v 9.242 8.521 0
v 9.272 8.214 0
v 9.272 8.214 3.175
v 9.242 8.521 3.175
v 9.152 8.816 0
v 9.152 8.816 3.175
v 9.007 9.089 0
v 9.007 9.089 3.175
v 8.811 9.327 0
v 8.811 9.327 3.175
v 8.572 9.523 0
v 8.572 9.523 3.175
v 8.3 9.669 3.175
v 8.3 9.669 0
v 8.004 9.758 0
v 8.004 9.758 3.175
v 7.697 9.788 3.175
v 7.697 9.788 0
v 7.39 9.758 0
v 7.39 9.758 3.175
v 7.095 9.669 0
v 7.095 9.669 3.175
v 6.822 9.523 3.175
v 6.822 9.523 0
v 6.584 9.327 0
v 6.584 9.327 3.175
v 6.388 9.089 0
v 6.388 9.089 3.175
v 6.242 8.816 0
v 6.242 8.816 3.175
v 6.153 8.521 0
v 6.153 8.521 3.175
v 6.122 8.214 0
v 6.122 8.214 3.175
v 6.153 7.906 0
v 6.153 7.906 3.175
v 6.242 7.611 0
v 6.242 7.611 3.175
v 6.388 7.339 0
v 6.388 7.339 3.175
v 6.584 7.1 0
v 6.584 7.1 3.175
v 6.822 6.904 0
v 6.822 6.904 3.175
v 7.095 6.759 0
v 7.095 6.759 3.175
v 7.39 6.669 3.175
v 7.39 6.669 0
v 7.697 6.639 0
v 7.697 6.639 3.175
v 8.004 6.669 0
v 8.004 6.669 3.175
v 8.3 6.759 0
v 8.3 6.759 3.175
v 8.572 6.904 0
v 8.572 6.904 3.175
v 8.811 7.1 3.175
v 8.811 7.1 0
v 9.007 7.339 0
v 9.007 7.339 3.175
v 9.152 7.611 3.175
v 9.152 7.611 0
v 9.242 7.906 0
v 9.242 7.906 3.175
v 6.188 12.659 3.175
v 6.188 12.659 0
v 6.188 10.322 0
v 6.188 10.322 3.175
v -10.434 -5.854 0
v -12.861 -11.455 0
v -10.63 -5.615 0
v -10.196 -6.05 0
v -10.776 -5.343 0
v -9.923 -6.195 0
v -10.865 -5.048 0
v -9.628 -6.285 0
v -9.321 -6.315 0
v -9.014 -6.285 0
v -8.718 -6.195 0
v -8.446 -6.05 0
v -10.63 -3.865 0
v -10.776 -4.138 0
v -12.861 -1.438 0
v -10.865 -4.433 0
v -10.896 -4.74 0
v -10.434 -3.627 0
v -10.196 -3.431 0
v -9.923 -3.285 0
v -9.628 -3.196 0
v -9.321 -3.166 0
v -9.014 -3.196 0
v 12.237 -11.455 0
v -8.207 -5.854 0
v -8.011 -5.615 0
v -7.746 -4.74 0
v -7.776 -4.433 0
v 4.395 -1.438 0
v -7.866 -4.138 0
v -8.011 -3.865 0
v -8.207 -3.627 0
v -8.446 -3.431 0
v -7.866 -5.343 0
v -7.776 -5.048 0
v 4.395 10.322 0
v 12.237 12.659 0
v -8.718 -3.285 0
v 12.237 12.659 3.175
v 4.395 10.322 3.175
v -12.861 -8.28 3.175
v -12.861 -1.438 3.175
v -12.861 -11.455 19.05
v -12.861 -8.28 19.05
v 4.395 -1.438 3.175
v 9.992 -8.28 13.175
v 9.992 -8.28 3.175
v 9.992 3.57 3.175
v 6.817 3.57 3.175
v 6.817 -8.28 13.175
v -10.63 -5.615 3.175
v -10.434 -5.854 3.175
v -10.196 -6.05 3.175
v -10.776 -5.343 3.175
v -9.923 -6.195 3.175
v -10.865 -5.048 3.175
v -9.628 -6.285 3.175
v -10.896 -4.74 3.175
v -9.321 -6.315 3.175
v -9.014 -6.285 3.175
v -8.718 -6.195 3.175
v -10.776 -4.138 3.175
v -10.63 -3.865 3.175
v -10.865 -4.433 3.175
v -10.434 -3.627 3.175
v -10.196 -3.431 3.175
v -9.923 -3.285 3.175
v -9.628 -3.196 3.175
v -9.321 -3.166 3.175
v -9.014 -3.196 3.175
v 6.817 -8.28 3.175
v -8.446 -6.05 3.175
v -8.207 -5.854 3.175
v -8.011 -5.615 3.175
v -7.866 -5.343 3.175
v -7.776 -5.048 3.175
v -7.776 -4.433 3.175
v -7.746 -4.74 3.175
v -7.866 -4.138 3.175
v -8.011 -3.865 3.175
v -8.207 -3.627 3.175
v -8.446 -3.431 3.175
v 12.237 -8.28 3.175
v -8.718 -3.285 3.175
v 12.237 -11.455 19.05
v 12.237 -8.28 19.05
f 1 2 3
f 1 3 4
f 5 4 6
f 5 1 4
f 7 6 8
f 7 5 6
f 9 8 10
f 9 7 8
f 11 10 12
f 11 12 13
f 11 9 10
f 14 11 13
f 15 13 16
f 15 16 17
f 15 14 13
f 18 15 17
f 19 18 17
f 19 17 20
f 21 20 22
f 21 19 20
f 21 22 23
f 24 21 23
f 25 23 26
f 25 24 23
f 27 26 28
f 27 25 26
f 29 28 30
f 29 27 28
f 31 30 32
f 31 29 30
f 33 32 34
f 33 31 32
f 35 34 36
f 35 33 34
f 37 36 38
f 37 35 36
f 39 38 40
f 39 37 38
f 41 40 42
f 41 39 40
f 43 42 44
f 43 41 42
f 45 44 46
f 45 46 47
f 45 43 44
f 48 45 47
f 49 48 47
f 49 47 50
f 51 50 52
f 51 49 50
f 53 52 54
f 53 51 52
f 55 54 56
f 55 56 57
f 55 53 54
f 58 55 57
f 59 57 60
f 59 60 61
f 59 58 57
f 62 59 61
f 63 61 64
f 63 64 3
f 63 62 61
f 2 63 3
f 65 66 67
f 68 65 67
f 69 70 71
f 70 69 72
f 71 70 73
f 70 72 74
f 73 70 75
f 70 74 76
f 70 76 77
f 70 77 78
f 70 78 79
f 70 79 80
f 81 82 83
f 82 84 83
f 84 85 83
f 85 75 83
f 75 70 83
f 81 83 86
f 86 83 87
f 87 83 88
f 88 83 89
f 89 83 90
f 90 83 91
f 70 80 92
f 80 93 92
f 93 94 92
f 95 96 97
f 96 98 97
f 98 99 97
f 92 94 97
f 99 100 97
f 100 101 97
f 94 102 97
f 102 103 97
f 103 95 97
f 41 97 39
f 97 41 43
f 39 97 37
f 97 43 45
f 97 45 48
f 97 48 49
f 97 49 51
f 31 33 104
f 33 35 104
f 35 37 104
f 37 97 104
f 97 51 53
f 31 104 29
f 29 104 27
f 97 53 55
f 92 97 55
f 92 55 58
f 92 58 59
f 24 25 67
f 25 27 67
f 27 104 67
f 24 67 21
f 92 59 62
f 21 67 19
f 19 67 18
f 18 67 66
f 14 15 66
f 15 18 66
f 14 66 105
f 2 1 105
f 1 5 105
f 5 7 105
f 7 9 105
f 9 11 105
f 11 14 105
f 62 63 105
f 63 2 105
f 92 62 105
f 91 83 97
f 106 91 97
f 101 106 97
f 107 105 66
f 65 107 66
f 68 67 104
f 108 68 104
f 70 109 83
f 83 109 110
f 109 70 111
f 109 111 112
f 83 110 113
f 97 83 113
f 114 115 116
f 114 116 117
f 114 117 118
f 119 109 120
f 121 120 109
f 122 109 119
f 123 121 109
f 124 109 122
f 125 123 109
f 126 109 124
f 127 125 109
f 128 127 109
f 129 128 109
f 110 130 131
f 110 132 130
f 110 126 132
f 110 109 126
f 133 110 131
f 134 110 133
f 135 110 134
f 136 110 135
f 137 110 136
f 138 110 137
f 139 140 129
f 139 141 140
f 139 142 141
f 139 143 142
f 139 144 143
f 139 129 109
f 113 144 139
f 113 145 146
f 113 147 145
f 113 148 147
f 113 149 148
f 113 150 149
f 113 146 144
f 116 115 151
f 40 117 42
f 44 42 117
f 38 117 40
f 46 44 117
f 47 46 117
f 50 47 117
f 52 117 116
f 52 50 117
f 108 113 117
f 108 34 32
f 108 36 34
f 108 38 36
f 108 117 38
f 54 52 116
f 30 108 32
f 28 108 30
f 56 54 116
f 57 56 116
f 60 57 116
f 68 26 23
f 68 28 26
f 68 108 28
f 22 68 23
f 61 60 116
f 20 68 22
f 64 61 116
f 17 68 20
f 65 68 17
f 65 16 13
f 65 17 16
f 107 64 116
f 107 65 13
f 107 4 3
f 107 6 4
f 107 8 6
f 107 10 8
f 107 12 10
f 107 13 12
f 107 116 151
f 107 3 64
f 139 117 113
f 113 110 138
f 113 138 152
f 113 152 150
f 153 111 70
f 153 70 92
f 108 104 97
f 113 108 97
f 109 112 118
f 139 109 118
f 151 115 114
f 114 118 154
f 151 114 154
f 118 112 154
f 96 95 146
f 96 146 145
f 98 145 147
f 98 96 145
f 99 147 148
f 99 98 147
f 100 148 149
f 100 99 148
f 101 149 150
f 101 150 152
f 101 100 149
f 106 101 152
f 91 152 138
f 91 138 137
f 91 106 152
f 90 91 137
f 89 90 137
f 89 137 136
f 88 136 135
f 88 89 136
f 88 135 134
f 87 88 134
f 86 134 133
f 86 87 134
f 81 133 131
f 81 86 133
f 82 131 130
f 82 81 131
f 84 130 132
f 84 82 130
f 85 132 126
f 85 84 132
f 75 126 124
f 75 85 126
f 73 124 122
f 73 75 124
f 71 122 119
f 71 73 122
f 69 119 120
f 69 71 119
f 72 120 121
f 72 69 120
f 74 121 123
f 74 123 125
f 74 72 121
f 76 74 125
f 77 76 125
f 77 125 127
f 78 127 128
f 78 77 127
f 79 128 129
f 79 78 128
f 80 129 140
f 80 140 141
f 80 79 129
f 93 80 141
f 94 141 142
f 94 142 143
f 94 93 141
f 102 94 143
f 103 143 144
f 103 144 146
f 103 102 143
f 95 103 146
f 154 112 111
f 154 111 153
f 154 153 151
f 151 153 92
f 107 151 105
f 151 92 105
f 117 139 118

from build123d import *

# Parameters (mm, degrees)
SKETCH2_R           = 1.5748
BOSS_EXTRUDE1_DEPTH = 3.175
SKETCH5_W           = 24.098
SKETCH5_H           = 3.175
BOSS_EXTRUDE2_DEPTH = 19.05
SKETCH7_W           = 1
SKETCH7_H           = 6.842
BOSS_EXTRUDE3_DEPTH = 3.175
SKETCH8_W           = 1
SKETCH8_H           = 3.175
BOSS_EXTRUDE4_DEPTH = 19.05
SKETCH9_W           = 3.175
SKETCH9_H           = 11.85042952
BOSS_EXTRUDE5_DEPTH = 10
CUT_EXTRUDE1_DEPTH  = 33.332180825


with BuildPart() as part:
    # Sketch2 → Boss-Extrude1 (new body)
    with BuildSketch(Plane.XY):
        Polygon((4.395213829, 10.321811953), (4.395213829, 7.827388121), (4.395213829, -1.438404904), (-11.860786171, -1.438404904), (-11.860786171, -8.280404904), (12.237213829, -8.280404904), (12.237213829, 12.658595096), (7.697213829, 12.658595096), (6.188170382, 12.658595096), (6.188170382, 10.321811953), align=None)
        with Locations((-9.320786171, -4.740404904)):
            Circle(SKETCH2_R, mode=Mode.SUBTRACT)
        with Locations((7.697213829, 8.213595096)):
            Circle(SKETCH2_R, mode=Mode.SUBTRACT)
    extrude(amount=BOSS_EXTRUDE1_DEPTH)

    # Sketch5 → Boss-Extrude2 (add)
    with BuildSketch(Plane(origin=(0, 0, 0), x_dir=(-1, 0, 0), z_dir=(0, 0, -1))):
        with Locations((-0.188213829, -9.867904904)):
            Rectangle(SKETCH5_W, SKETCH5_H)
    extrude(amount=-BOSS_EXTRUDE2_DEPTH)

    # Sketch7 → Boss-Extrude3 (add)
    with BuildSketch(Plane.XY.offset(3.175)):
        with Locations((-12.360786171, -4.859404904)):
            Rectangle(SKETCH7_W, SKETCH7_H)
    extrude(amount=-BOSS_EXTRUDE3_DEPTH)

    # Sketch8 → Boss-Extrude4 (add)
    with BuildSketch(Plane.XY.offset(19.05)):
        with Locations((-12.360786171, -9.867904904)):
            Rectangle(SKETCH8_W, SKETCH8_H)
    extrude(amount=-BOSS_EXTRUDE4_DEPTH)

    # Sketch9 → Boss-Extrude5 (add)
    with BuildSketch(Plane.XY.offset(3.175)):
        with Locations((8.404008836, -2.355190144)):
            Rectangle(SKETCH9_W, SKETCH9_H)
    extrude(amount=BOSS_EXTRUDE5_DEPTH)

    # Sketch10 → Cut-Extrude1 (cut, through all)
    with BuildSketch(Plane(origin=(9.991508836, 0, 0), x_dir=(0, 0, -1), z_dir=(1, 0, 0))):
        Polygon((-3.175, 3.570024616), (-13.175, -8.280404904), (-13.175, 3.570024616), align=None)
    extrude(amount=-CUT_EXTRUDE1_DEPTH, mode=Mode.SUBTRACT)


solid = part.part
